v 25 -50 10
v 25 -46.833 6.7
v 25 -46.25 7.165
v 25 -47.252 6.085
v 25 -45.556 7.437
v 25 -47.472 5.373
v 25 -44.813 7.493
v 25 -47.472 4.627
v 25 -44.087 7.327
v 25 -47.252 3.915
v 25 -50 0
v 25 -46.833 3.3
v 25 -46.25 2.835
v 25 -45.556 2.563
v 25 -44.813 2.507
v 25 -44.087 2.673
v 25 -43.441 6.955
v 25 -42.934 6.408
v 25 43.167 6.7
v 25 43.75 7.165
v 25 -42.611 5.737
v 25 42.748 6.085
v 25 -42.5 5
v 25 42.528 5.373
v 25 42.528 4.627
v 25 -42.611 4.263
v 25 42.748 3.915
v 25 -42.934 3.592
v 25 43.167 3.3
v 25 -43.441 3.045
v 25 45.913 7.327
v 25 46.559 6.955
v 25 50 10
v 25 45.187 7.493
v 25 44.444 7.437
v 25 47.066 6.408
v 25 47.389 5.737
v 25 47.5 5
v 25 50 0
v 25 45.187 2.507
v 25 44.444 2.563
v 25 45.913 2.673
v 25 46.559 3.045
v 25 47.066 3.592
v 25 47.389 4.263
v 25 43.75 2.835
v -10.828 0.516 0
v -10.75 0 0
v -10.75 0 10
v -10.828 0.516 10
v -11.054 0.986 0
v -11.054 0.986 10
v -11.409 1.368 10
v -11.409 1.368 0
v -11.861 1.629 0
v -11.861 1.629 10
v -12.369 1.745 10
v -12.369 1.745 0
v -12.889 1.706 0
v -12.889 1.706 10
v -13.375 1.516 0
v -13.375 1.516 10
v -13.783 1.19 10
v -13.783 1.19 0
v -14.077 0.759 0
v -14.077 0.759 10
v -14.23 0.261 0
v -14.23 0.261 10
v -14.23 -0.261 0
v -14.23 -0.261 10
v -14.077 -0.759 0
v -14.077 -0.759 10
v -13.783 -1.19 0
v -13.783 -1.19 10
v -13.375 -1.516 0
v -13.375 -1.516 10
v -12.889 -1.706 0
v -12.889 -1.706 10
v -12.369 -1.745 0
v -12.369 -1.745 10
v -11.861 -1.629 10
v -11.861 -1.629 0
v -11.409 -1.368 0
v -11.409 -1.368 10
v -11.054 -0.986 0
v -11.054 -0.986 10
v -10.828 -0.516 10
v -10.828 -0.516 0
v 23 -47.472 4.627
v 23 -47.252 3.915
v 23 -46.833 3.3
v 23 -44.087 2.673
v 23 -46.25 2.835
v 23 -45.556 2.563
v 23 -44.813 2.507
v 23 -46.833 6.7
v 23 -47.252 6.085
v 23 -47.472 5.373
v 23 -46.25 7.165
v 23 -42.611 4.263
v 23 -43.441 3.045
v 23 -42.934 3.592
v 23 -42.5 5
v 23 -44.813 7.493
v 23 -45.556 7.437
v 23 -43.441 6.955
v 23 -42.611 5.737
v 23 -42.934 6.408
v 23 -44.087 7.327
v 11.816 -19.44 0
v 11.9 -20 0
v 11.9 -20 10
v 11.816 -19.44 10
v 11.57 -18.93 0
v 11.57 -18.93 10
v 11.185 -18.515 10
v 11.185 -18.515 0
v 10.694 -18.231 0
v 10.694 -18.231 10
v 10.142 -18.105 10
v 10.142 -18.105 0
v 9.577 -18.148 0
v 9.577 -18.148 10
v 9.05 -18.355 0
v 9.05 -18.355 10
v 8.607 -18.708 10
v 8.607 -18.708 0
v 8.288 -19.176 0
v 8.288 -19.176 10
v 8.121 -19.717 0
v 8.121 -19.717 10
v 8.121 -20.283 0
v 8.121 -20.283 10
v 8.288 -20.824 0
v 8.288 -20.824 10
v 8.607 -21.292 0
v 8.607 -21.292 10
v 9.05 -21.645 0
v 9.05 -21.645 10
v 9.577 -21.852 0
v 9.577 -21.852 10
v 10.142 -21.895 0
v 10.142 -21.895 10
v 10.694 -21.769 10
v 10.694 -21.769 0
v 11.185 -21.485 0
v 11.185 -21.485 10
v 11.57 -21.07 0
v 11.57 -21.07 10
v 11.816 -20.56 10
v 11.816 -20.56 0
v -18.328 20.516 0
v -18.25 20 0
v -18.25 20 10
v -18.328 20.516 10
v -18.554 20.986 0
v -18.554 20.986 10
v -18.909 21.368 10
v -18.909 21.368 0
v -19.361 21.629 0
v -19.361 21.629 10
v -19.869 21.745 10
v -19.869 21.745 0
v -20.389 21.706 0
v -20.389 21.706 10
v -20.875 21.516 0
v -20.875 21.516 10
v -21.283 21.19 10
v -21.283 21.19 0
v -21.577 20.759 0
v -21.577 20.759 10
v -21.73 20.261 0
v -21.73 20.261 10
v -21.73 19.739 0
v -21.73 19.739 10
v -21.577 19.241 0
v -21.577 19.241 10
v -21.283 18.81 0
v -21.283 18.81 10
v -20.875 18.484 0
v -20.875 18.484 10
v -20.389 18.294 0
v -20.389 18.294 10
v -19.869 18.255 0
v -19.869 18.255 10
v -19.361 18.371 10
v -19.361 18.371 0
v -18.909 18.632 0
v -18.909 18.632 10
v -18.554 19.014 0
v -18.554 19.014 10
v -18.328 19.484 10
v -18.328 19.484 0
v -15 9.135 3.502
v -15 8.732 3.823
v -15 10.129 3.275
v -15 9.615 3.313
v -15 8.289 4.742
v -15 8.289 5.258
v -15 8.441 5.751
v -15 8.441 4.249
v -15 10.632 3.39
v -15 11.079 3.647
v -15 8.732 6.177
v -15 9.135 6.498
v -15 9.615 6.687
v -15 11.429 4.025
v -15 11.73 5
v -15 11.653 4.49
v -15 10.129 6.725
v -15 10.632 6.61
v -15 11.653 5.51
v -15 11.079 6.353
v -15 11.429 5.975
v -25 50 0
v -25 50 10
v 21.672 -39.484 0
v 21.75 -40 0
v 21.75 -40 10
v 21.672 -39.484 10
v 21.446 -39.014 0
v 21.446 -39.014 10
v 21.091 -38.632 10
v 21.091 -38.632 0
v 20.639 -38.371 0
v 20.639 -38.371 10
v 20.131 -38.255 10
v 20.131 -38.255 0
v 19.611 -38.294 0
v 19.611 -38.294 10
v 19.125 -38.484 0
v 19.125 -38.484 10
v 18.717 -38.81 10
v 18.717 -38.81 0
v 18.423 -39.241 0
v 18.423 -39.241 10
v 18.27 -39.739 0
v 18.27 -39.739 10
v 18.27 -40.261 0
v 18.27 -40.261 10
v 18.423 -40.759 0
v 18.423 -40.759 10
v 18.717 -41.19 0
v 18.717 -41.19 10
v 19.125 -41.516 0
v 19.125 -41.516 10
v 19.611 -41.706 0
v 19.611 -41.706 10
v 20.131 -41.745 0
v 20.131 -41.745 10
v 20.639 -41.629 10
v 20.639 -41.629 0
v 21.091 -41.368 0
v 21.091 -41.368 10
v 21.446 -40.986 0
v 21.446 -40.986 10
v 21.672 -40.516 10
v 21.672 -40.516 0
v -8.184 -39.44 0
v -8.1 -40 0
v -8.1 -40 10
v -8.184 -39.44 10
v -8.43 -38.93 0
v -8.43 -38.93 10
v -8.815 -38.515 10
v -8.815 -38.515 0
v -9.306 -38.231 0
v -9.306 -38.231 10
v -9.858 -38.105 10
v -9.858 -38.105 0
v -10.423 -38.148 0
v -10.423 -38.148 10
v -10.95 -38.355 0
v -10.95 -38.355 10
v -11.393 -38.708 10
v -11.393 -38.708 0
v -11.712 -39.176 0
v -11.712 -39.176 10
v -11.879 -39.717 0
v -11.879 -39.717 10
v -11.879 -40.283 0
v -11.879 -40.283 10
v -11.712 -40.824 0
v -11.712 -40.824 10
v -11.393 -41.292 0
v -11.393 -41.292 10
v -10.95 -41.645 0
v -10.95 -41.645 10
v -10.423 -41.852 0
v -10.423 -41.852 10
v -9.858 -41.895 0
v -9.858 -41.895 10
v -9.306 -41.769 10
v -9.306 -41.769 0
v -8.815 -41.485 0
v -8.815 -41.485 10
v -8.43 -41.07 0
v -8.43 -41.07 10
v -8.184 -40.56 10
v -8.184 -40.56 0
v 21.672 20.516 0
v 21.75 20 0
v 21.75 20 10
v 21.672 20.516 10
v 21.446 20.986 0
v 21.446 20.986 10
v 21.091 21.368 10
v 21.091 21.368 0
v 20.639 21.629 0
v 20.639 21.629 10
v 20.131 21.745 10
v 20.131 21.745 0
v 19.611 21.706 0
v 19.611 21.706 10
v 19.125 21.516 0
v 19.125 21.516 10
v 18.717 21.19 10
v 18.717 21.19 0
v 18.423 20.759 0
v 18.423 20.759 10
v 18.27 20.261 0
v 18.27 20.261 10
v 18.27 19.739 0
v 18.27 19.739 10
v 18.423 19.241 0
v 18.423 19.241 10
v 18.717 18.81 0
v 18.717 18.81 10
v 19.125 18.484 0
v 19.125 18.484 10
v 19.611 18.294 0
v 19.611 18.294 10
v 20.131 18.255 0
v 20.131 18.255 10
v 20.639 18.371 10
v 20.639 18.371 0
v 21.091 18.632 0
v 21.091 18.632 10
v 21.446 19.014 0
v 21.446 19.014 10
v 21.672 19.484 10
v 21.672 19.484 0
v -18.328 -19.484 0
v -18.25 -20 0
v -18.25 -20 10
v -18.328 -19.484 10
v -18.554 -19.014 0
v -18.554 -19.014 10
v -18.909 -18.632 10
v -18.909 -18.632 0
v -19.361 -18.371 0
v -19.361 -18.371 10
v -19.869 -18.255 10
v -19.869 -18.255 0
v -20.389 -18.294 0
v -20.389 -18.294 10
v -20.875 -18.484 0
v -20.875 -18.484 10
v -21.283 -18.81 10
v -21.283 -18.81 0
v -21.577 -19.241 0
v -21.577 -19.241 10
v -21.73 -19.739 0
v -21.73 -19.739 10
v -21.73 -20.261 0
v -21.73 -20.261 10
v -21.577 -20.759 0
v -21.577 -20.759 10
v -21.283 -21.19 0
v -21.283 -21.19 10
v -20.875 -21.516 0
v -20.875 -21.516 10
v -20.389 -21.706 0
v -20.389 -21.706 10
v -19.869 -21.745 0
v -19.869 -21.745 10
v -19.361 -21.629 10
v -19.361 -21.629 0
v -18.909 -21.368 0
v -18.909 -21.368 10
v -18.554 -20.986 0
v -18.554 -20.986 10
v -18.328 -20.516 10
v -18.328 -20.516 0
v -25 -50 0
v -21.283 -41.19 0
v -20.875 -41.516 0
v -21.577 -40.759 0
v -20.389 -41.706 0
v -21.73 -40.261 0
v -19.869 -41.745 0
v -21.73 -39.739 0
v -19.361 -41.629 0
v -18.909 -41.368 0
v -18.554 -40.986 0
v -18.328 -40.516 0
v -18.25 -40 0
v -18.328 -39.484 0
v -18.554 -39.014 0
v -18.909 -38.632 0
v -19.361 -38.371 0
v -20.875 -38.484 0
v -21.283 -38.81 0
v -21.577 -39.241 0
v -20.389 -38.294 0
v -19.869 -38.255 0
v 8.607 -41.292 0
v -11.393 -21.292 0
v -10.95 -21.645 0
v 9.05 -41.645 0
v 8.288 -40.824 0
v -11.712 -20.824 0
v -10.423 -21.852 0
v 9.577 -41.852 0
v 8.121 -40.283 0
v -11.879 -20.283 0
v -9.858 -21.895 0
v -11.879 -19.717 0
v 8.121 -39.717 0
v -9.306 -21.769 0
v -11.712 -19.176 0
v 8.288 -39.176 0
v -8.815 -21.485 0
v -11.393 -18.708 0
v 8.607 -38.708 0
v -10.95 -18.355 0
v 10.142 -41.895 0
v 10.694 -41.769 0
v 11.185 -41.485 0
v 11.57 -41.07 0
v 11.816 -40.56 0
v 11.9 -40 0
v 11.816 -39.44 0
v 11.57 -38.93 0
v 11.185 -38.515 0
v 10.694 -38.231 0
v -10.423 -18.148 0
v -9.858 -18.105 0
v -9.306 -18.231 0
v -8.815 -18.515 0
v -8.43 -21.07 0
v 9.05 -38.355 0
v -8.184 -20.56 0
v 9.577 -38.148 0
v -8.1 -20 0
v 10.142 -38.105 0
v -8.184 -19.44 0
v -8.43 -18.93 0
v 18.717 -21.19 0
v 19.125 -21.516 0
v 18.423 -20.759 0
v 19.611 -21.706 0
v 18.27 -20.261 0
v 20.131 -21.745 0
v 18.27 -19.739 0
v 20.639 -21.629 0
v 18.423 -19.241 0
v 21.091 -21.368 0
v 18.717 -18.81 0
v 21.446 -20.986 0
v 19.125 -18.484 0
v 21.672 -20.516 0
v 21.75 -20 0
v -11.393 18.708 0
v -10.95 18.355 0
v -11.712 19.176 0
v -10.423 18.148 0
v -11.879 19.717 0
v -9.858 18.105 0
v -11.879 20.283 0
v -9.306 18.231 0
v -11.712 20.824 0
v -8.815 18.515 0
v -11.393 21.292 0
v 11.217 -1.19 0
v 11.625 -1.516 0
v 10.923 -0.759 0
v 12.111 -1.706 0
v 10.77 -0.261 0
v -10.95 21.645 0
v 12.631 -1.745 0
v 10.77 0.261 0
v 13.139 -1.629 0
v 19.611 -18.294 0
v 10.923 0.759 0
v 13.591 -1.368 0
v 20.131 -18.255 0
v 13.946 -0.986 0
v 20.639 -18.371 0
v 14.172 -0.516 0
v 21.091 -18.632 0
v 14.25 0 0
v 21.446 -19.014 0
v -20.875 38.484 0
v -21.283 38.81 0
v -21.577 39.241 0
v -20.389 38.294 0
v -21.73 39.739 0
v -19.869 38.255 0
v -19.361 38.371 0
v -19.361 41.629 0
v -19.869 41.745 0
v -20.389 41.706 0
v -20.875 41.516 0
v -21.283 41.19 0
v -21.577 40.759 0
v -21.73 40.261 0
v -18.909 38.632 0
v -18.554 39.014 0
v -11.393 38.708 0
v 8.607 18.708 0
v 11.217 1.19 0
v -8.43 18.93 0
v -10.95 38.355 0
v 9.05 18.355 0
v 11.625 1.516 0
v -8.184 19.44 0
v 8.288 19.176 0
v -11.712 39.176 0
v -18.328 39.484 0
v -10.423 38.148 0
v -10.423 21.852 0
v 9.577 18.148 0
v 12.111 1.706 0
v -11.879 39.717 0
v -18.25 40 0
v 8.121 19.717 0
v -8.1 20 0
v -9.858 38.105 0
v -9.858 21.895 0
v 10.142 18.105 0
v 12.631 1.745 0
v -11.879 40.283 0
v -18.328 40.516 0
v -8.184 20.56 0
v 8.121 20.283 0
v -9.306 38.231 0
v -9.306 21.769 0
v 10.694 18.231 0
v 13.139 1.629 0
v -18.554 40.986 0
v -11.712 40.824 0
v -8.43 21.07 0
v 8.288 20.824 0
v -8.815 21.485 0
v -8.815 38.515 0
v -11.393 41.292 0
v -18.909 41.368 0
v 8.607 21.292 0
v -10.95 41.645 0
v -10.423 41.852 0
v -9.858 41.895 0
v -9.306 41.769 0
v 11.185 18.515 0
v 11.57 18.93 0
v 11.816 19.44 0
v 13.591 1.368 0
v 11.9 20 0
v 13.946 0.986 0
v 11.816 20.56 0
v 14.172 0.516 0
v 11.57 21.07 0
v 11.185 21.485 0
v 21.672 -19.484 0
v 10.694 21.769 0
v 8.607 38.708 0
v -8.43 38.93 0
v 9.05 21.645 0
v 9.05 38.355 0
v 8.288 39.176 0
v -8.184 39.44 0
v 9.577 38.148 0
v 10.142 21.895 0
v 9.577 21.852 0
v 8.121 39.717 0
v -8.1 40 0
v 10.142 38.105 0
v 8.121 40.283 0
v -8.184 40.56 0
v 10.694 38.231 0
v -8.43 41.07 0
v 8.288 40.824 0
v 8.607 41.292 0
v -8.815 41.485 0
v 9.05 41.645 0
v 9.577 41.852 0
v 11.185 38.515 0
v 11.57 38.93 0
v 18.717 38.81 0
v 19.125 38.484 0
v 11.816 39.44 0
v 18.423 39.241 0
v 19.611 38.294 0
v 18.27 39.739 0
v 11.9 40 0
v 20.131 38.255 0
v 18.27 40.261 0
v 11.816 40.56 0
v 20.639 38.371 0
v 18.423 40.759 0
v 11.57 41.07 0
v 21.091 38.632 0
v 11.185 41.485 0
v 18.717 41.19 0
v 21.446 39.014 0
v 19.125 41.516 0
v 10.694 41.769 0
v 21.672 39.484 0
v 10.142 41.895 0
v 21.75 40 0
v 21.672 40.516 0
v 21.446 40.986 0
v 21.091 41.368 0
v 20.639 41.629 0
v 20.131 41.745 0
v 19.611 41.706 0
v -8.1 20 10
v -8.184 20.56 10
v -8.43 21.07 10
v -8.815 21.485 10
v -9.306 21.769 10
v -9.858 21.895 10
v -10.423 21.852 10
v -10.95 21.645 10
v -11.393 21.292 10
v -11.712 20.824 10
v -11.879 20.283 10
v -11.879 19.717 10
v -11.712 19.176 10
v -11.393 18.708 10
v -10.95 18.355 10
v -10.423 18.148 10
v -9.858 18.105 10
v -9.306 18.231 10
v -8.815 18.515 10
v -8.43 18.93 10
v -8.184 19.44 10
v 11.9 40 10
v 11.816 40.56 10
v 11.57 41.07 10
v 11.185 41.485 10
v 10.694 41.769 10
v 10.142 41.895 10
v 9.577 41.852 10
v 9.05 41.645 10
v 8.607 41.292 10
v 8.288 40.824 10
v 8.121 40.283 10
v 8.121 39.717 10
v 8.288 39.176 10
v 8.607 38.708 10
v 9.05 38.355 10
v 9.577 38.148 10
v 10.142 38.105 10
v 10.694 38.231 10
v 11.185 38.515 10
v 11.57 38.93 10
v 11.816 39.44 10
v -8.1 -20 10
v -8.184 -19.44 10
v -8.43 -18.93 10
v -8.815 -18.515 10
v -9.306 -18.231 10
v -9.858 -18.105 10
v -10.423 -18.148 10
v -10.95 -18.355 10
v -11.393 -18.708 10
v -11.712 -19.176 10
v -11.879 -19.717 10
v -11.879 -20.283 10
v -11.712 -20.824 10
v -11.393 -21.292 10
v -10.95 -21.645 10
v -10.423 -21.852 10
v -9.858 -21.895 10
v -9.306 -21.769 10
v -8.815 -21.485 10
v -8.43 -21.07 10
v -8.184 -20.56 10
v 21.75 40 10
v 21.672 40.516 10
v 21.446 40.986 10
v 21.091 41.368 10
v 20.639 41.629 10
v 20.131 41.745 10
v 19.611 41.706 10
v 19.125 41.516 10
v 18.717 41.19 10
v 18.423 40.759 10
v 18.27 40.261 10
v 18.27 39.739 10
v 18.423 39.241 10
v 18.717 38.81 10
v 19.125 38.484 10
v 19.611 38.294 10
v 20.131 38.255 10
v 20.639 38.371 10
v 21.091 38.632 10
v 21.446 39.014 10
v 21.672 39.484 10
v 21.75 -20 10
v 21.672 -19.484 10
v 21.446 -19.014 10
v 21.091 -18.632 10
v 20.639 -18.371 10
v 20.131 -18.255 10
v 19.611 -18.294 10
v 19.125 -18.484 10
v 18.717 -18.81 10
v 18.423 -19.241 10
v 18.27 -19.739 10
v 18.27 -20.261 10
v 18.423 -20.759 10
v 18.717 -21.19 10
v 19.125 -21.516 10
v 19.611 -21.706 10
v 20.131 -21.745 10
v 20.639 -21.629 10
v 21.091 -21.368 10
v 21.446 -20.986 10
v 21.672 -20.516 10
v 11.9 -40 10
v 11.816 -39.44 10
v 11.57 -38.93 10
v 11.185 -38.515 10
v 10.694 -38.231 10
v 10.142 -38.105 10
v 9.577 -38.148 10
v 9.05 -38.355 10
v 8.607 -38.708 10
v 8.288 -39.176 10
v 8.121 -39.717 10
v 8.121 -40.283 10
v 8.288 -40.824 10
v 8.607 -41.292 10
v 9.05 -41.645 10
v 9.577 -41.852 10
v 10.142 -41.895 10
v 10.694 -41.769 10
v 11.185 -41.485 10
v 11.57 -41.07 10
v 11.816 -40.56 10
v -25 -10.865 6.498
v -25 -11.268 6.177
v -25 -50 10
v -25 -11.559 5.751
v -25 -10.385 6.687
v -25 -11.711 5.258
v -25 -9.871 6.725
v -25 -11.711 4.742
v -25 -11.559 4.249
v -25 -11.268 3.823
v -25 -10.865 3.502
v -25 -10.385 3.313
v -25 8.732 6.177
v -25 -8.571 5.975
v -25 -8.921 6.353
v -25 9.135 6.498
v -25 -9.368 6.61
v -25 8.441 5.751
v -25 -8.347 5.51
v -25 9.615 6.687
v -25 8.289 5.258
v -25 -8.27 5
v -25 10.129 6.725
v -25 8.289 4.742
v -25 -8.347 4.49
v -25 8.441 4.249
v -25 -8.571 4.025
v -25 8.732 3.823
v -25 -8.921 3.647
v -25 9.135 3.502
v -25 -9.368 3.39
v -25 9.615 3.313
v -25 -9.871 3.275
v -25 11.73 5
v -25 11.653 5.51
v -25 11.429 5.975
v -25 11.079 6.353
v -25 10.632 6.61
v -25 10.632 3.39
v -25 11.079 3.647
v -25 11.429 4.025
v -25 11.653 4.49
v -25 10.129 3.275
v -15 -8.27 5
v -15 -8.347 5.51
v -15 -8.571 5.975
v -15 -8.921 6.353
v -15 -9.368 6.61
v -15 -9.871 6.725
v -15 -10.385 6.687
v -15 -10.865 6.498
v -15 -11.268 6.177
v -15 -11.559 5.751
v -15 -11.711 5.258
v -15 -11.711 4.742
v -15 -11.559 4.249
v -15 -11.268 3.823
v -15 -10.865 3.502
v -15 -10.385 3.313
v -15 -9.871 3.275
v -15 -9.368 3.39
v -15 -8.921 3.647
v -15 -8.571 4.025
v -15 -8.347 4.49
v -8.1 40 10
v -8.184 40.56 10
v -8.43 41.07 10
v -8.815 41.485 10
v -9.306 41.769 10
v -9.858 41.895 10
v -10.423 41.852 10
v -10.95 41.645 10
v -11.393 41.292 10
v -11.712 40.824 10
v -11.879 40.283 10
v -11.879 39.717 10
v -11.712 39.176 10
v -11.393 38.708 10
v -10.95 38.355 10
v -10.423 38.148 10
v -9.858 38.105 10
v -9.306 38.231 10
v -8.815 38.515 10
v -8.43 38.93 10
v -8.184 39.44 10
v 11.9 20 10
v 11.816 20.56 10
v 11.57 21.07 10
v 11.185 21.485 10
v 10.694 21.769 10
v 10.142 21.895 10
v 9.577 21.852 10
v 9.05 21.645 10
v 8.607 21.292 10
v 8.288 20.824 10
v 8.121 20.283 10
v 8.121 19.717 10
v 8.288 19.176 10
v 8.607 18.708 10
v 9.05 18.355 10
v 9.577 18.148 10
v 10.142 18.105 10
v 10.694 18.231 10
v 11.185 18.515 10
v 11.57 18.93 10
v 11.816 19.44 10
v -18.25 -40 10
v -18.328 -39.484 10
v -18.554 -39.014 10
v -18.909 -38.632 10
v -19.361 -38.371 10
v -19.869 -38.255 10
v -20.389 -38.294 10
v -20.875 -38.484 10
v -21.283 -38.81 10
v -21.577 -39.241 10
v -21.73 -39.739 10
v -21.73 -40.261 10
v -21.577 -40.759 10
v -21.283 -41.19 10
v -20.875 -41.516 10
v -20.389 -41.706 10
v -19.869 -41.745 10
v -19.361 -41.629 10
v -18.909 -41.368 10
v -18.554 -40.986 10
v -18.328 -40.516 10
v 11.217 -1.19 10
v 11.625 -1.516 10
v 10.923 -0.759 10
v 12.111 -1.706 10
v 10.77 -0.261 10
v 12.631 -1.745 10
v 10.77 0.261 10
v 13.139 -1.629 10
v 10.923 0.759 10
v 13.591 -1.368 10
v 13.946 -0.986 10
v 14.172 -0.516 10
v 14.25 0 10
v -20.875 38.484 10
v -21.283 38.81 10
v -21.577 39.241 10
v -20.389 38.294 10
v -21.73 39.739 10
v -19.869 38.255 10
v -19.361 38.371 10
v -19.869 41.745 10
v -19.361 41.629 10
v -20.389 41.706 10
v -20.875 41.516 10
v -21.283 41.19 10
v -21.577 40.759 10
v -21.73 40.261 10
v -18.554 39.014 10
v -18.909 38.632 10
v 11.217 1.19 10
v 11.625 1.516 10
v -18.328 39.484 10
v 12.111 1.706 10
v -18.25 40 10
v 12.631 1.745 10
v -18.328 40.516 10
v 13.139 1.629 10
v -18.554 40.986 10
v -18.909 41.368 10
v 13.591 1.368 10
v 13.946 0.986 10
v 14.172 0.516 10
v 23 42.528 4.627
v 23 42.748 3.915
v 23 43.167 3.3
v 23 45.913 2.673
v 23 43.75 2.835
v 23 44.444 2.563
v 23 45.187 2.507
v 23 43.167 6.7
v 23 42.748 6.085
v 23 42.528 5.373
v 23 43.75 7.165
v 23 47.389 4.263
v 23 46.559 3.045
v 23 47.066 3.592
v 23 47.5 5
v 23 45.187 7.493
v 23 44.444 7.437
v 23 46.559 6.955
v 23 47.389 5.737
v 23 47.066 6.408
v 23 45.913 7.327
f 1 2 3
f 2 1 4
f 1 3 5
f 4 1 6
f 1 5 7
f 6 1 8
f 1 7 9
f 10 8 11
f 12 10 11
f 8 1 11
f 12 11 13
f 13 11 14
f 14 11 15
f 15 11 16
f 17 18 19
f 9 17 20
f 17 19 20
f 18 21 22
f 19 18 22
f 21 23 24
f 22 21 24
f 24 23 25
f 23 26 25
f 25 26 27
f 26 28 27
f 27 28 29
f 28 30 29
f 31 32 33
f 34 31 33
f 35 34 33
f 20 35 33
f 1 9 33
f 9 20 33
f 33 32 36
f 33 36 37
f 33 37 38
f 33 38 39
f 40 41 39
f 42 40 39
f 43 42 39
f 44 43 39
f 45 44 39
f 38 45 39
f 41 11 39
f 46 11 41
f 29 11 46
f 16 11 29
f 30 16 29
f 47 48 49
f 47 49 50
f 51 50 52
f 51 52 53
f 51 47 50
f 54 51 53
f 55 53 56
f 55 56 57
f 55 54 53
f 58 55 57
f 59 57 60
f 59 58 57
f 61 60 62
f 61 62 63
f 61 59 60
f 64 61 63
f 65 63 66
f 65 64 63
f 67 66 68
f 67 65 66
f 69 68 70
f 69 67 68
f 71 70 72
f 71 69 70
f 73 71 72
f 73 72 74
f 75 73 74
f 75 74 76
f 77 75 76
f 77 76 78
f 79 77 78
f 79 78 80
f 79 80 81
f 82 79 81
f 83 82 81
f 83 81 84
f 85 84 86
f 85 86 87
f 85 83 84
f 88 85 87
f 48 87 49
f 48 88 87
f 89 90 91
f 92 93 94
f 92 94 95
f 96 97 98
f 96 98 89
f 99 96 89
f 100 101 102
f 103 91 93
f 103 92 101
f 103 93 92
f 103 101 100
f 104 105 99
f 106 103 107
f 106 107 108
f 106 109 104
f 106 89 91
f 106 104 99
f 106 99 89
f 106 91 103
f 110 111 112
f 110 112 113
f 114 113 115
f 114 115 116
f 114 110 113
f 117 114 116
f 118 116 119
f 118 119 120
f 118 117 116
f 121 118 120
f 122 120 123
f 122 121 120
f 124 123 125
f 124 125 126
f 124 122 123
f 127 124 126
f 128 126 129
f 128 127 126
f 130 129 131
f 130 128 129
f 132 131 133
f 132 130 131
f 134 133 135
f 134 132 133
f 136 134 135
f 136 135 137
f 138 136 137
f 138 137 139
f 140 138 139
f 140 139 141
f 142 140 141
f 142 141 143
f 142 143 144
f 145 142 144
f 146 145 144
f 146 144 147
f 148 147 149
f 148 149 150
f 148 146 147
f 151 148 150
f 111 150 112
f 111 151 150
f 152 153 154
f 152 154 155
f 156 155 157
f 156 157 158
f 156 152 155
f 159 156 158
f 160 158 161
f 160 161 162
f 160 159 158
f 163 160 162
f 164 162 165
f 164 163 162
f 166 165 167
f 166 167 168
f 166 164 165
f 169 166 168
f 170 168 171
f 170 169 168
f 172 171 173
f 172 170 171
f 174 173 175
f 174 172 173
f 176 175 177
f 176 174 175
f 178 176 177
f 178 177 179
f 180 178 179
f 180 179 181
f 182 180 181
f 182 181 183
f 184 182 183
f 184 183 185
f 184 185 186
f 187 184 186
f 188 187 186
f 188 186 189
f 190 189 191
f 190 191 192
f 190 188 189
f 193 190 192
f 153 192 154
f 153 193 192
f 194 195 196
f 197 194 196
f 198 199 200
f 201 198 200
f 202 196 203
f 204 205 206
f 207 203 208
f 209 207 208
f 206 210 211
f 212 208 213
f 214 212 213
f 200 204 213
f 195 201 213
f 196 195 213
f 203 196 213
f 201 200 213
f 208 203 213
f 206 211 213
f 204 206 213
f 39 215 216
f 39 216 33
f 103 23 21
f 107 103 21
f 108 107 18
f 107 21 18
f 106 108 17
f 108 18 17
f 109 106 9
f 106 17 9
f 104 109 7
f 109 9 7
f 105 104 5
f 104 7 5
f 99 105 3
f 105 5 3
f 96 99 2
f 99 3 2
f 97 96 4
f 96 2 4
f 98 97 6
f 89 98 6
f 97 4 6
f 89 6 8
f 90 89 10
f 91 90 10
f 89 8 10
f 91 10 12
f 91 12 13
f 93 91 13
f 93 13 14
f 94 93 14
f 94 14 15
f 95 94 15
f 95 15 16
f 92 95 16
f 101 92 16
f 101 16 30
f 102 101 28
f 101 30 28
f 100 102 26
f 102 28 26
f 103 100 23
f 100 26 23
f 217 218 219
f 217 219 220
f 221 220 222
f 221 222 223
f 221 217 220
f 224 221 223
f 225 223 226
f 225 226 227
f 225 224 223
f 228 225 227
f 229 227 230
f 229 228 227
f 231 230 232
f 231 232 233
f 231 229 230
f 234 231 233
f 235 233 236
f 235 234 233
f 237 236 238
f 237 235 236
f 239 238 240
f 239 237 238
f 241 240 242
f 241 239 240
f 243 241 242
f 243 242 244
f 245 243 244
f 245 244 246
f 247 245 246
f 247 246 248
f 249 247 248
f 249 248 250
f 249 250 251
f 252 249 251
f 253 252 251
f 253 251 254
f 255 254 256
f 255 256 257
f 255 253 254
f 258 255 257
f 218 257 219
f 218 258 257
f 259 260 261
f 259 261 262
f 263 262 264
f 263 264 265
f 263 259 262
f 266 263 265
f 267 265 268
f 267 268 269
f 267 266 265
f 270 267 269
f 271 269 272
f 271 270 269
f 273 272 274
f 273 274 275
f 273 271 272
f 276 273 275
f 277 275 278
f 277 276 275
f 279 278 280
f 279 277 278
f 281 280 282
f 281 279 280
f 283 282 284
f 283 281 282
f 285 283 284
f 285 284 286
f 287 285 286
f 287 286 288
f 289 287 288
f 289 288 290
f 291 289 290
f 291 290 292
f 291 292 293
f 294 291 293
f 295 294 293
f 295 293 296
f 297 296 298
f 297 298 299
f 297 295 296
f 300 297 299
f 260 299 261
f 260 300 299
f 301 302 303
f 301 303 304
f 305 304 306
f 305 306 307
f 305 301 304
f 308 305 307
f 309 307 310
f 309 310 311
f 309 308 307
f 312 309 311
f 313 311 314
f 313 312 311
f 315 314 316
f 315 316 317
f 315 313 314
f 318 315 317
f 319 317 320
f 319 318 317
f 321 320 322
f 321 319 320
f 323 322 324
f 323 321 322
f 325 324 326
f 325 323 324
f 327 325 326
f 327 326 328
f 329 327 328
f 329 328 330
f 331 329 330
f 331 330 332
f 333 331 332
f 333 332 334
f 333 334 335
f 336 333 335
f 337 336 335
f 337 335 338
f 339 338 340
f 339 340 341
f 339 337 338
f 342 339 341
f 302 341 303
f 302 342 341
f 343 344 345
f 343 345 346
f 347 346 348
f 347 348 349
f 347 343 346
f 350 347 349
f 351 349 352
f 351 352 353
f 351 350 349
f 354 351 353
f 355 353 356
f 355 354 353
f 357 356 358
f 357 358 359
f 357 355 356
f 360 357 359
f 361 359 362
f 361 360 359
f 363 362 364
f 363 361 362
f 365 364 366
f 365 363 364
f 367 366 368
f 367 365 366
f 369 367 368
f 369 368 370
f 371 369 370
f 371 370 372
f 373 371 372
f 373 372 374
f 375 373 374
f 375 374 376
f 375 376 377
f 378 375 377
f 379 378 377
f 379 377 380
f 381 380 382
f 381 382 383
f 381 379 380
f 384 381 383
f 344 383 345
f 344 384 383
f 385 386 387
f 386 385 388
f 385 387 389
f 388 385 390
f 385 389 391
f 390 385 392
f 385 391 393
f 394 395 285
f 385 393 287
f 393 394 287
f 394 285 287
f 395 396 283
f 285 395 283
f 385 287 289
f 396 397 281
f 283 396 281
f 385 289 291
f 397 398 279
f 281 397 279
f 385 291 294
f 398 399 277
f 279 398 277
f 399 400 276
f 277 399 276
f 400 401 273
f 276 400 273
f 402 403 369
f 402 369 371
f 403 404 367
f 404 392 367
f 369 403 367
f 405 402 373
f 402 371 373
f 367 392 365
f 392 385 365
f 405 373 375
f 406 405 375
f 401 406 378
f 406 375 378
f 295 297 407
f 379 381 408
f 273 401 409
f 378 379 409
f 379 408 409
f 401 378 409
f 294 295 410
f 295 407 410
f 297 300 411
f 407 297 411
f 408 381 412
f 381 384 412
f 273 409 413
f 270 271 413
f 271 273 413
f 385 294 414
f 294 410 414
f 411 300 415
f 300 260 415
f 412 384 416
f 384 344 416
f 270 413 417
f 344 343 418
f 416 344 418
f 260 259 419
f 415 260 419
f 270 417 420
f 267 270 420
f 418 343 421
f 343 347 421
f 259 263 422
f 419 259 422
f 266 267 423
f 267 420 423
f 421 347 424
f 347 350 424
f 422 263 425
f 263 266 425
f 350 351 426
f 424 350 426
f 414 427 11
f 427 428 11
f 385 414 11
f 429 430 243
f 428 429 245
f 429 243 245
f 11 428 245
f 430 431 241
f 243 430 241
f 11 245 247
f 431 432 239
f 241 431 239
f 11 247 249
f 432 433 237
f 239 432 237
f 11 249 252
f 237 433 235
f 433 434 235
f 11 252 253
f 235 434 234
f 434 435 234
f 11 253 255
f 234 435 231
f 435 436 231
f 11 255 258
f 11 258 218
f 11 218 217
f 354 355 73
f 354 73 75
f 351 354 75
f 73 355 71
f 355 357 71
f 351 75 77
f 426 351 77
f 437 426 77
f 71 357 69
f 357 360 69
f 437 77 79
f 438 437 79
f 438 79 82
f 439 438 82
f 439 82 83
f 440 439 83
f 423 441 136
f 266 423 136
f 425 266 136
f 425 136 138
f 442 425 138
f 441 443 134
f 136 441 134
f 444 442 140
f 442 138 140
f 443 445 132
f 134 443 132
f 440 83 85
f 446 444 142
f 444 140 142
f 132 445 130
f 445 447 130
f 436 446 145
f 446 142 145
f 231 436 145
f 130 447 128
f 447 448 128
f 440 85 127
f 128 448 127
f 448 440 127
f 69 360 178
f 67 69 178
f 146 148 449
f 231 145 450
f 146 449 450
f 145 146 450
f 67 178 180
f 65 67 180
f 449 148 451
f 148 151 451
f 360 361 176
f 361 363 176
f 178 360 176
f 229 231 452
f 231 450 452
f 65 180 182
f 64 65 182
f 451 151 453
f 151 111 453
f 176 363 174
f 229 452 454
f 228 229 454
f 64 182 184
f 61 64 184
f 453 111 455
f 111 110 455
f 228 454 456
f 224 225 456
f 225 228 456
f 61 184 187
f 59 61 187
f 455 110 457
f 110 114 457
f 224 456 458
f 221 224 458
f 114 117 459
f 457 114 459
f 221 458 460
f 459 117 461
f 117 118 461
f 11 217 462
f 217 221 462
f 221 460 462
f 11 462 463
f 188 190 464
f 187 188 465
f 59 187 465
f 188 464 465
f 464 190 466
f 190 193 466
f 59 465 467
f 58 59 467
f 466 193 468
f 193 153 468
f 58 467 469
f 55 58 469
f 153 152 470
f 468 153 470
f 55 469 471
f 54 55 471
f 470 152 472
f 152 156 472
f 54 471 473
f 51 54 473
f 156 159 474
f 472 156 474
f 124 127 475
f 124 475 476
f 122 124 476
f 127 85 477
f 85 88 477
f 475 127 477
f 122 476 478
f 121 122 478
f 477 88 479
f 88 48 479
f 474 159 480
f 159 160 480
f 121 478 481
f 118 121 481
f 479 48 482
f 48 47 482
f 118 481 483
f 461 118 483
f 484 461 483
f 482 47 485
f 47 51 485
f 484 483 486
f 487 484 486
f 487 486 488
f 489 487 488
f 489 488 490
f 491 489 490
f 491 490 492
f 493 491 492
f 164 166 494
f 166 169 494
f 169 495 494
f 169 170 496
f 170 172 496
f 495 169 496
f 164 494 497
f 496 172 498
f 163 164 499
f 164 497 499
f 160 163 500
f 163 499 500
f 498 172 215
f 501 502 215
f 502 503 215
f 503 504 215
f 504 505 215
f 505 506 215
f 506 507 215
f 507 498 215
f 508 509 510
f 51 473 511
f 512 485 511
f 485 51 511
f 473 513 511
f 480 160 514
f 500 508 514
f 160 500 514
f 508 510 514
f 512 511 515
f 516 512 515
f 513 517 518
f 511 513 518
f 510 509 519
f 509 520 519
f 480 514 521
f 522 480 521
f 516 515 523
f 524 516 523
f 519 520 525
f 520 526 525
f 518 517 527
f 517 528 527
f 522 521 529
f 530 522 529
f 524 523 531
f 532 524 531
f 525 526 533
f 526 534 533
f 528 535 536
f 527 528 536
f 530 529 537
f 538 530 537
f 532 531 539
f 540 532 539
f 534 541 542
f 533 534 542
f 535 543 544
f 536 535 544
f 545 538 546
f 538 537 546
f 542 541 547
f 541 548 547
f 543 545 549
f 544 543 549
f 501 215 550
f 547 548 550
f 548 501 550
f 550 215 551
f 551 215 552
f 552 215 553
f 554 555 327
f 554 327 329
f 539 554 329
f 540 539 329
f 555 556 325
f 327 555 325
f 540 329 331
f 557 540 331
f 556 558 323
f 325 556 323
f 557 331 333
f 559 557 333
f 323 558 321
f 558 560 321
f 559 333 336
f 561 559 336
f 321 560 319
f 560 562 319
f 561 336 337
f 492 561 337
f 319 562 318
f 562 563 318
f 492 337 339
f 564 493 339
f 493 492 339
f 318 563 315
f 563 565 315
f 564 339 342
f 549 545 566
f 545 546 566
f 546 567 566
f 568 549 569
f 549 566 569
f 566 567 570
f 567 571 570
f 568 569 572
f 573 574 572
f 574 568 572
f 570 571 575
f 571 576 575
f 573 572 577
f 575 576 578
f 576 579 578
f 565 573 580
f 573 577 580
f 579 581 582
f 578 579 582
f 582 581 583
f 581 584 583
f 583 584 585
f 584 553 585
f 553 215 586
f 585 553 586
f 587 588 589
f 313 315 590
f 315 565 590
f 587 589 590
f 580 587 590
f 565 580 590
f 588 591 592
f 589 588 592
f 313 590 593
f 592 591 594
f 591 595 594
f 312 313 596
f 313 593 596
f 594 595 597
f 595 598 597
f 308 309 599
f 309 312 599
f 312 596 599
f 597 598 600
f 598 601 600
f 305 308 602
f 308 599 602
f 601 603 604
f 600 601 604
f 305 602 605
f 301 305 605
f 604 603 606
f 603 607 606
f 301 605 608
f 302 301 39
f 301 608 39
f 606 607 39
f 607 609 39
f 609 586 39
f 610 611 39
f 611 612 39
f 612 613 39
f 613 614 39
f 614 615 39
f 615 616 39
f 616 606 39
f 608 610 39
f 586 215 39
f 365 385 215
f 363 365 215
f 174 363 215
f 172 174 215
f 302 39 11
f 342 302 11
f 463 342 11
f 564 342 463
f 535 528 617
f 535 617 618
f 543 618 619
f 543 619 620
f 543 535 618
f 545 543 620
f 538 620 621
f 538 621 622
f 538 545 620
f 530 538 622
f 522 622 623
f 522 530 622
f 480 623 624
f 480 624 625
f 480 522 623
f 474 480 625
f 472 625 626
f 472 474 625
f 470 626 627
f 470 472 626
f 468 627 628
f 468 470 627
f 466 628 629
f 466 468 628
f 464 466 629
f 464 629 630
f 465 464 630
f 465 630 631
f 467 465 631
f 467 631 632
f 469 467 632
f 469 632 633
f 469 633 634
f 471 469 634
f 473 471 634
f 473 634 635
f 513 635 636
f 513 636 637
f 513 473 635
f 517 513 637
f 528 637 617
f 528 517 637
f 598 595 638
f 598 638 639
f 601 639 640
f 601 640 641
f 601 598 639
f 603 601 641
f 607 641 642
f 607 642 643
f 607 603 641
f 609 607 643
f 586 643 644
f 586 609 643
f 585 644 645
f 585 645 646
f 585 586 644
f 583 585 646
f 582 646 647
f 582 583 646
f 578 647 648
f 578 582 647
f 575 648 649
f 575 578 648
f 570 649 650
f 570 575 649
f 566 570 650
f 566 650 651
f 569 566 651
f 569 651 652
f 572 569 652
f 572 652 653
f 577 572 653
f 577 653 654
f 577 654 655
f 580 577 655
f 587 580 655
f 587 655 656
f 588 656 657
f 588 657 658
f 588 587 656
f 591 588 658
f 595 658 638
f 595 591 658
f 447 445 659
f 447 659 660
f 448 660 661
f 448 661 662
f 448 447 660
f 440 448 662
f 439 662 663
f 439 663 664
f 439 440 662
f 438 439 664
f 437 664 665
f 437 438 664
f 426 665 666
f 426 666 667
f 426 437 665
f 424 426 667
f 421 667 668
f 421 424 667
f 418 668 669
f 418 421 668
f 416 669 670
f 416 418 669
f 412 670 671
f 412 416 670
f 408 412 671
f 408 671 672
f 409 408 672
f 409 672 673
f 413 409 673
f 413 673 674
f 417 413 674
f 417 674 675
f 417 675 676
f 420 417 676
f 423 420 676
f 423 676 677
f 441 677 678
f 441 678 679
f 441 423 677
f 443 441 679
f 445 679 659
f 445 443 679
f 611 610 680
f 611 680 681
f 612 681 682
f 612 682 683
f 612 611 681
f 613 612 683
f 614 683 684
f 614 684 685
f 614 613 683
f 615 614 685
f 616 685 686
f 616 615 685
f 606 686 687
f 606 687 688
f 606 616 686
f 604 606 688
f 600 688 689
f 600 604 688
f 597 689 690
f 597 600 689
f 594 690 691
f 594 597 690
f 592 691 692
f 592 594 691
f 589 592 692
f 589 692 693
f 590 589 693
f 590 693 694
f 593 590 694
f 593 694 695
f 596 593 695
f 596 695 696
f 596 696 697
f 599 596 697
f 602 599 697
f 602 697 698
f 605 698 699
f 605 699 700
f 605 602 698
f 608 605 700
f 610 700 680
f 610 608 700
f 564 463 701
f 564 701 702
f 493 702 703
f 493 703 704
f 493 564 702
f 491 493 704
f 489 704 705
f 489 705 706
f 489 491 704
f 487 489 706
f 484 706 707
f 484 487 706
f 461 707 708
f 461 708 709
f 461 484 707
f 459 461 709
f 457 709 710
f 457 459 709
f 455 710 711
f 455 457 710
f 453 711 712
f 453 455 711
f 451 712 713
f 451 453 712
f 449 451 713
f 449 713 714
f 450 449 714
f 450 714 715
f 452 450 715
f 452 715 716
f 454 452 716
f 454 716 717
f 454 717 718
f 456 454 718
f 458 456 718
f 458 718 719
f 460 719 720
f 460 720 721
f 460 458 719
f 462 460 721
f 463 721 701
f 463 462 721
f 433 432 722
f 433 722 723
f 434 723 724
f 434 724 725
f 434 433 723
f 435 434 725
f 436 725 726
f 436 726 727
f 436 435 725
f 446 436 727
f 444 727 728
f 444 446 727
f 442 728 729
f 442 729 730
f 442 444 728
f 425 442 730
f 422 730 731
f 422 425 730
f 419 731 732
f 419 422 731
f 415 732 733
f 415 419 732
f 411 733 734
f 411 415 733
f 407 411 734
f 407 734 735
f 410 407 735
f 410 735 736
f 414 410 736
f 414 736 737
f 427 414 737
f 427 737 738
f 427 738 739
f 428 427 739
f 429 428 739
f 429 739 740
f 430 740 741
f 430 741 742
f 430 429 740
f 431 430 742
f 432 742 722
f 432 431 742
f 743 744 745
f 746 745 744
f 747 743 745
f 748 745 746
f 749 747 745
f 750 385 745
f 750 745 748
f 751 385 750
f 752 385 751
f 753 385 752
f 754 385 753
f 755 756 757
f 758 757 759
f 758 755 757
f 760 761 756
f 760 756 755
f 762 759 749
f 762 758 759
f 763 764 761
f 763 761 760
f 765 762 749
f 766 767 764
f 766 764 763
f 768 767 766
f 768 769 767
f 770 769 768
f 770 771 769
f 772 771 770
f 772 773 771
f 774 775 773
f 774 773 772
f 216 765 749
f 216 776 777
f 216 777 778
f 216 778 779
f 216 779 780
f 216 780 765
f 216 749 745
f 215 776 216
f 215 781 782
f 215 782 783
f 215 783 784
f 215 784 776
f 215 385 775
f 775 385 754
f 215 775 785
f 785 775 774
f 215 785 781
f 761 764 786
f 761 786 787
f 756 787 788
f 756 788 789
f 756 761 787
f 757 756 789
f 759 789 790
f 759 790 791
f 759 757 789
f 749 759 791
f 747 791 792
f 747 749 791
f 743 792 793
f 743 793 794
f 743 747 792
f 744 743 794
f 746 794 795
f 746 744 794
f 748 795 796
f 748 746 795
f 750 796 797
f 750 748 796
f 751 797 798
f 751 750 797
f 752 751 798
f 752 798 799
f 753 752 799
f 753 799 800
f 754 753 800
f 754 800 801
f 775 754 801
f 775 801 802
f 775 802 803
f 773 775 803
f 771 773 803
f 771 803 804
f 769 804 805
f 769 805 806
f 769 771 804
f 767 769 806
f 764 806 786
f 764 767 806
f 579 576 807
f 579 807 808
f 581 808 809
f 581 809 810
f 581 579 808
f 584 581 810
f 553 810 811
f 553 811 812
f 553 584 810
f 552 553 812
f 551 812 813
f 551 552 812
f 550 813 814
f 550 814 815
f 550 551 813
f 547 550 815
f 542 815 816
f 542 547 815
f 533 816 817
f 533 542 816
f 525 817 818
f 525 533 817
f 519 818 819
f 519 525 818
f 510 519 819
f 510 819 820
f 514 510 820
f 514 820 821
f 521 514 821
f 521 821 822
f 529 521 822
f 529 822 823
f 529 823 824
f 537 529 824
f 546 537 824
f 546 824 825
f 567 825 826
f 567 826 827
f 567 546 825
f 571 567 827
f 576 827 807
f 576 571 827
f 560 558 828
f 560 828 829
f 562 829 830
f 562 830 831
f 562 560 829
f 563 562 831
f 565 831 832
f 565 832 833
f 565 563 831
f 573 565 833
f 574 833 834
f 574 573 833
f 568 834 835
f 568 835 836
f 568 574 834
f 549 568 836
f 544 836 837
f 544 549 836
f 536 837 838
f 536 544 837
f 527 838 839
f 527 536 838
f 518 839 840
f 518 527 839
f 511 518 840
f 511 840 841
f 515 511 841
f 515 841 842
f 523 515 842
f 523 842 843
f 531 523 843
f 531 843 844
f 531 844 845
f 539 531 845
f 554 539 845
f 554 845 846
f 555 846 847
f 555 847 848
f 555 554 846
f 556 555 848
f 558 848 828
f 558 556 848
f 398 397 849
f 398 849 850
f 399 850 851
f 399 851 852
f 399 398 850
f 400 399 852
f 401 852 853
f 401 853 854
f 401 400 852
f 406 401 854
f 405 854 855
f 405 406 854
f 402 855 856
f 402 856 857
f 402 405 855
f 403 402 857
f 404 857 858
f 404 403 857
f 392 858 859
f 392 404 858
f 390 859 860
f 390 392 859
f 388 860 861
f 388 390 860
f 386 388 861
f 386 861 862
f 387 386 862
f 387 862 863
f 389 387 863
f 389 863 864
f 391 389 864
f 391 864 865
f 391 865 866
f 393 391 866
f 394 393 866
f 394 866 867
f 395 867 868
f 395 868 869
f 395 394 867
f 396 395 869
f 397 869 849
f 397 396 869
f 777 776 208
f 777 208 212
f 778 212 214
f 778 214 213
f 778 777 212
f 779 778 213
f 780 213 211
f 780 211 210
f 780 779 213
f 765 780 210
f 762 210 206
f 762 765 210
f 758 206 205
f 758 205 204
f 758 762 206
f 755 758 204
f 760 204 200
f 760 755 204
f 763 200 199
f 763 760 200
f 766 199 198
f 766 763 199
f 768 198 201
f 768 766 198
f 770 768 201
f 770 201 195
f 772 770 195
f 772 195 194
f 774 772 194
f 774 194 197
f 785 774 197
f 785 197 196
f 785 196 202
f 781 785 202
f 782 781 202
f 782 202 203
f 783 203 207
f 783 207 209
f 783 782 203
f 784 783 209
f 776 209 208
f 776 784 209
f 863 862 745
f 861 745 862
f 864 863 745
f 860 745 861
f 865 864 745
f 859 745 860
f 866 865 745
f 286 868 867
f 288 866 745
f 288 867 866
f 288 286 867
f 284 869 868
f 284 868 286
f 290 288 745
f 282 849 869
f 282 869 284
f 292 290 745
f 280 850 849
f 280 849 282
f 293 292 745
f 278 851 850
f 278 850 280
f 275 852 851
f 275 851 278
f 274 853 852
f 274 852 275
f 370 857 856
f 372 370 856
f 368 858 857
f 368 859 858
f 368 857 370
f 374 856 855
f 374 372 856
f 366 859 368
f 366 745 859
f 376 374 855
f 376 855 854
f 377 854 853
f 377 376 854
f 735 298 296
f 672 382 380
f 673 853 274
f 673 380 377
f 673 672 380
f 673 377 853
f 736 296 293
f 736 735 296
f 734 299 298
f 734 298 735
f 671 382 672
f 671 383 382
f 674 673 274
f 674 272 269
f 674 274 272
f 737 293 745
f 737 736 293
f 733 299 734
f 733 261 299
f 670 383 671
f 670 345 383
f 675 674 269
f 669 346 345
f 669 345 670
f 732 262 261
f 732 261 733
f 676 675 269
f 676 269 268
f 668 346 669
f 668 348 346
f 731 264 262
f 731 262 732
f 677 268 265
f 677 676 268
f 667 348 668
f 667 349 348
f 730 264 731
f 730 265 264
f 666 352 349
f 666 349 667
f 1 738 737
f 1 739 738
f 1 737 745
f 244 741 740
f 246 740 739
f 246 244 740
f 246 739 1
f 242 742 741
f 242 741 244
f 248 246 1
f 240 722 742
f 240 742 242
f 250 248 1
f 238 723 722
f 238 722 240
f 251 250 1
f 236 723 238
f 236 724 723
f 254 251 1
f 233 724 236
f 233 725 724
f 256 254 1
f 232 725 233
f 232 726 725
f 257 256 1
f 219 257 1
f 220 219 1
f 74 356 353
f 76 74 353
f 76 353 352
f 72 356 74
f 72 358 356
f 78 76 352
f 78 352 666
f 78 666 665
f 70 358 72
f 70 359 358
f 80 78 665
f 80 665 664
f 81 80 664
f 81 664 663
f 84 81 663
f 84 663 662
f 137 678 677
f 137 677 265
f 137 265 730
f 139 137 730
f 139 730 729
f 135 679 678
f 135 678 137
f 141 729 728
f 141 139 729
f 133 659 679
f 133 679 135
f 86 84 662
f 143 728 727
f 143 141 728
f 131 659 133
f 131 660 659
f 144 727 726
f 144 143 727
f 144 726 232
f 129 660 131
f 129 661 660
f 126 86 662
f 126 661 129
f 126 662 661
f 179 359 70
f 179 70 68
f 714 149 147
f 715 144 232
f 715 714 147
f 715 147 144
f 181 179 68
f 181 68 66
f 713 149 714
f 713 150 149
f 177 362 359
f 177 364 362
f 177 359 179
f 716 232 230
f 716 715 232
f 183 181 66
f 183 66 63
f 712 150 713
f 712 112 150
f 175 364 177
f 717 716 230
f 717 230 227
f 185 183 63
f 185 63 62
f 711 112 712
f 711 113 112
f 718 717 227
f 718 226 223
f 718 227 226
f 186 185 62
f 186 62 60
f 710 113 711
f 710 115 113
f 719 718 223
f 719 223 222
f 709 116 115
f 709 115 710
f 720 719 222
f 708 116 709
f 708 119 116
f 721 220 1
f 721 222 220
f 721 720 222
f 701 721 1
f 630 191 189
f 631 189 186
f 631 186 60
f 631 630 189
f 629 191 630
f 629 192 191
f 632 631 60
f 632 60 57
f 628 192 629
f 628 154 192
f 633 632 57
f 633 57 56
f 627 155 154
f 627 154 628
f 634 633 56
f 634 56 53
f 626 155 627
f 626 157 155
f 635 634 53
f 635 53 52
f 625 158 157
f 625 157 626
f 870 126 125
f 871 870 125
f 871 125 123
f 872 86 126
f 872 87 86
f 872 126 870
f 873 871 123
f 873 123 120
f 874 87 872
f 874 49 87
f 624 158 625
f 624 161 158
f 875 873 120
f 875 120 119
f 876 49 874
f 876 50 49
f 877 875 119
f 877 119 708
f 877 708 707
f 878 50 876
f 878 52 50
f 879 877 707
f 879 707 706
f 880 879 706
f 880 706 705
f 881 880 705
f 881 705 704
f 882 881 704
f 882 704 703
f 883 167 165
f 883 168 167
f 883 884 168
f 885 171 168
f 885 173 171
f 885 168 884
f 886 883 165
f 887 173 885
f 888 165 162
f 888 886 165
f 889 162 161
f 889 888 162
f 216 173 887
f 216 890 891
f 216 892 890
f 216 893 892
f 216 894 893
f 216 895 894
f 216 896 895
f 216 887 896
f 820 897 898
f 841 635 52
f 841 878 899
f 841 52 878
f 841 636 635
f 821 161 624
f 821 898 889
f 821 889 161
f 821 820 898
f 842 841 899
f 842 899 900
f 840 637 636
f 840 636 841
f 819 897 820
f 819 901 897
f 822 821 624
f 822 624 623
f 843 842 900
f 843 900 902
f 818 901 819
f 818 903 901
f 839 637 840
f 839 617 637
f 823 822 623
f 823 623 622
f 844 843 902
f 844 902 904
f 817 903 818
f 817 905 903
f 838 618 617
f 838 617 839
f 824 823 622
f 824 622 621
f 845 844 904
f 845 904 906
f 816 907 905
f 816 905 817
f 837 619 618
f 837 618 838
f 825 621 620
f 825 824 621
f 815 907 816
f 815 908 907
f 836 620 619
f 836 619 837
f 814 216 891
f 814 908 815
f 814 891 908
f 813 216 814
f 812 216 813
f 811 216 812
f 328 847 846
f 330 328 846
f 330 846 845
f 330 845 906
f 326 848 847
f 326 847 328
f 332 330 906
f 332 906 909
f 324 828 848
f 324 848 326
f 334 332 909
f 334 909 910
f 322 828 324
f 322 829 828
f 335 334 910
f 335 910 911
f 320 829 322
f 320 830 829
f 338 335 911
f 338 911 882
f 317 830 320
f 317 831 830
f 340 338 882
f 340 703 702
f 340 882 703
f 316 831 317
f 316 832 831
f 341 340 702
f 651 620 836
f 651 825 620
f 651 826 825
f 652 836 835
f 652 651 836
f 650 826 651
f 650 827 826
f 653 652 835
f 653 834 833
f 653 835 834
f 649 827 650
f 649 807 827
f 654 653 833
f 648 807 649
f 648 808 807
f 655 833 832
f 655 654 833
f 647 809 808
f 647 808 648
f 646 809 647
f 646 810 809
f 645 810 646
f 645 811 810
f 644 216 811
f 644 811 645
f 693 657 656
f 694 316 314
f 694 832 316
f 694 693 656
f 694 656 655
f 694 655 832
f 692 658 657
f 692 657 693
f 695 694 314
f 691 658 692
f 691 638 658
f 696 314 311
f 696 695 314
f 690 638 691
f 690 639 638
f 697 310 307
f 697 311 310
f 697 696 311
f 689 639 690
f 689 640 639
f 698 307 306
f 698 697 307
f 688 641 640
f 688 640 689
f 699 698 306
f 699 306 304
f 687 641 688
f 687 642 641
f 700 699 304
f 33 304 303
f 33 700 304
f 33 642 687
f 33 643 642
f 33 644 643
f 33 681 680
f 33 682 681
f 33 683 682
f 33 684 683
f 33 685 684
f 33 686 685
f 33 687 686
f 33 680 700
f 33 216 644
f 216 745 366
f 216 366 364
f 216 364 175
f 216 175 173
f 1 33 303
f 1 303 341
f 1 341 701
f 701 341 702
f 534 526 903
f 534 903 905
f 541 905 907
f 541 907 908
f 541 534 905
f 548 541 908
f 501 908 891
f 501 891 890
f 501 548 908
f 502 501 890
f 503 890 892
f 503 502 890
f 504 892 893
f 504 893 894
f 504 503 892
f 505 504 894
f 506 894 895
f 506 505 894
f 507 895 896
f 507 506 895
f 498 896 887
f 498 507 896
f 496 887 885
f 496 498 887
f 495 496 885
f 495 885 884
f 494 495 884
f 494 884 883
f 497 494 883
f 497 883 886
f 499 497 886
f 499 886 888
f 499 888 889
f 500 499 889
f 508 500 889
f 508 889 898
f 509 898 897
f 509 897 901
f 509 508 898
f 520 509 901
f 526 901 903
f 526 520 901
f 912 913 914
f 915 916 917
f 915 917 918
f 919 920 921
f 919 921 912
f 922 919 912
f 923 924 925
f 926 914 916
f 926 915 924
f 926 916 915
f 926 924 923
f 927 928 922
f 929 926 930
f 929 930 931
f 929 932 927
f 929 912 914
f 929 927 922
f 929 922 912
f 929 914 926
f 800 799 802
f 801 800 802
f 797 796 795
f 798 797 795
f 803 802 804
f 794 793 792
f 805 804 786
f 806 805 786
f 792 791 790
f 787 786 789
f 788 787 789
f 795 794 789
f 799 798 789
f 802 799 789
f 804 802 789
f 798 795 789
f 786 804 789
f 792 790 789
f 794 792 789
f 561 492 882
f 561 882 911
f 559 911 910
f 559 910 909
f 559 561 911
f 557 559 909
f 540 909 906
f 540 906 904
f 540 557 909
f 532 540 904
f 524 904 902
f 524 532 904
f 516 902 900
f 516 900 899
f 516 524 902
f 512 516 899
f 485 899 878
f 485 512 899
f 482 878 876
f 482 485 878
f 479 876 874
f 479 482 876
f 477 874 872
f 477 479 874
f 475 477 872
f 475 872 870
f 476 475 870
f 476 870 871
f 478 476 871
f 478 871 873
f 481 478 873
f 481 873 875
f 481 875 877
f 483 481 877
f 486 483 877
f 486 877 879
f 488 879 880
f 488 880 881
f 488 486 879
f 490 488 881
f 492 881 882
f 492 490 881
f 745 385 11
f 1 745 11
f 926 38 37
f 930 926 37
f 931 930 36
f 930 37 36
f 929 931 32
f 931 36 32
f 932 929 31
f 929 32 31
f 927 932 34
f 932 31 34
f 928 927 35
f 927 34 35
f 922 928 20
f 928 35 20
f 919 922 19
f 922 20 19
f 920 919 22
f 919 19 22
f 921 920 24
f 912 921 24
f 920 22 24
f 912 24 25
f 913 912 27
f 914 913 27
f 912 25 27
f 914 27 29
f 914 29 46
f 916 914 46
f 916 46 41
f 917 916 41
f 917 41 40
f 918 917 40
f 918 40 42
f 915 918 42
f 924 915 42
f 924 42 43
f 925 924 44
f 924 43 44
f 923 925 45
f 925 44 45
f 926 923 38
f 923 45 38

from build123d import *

# Parameters (mm, degrees)
SKETCH133_W     = 50
SKETCH133_H     = 100
SKETCH133_R     = 1.9
SKETCH133_R_2   = 1.75
PAD079_DEPTH    = 10
SKETCH143_R     = 2.5
POCKET049_DEPTH = 2
SKETCH149_R     = 1.73
POCKET051_DEPTH = 10


with BuildPart() as part:
    # Sketch133 → Pad079 (new body)
    with BuildSketch(Plane.XY):
        Rectangle(SKETCH133_W, SKETCH133_H)
        with Locations((-10, 40)):
            Circle(SKETCH133_R, mode=Mode.SUBTRACT)
        with Locations((10, 40)):
            Circle(SKETCH133_R, mode=Mode.SUBTRACT)
        with Locations((10, 20)):
            Circle(SKETCH133_R, mode=Mode.SUBTRACT)
        with Locations((-10, 20)):
            Circle(SKETCH133_R, mode=Mode.SUBTRACT)
        with Locations((-10, -20)):
            Circle(SKETCH133_R, mode=Mode.SUBTRACT)
        with Locations((10, -20)):
            Circle(SKETCH133_R, mode=Mode.SUBTRACT)
        with Locations((10, -40)):
            Circle(SKETCH133_R, mode=Mode.SUBTRACT)
        with Locations((-10, -40)):
            Circle(SKETCH133_R, mode=Mode.SUBTRACT)
        with Locations((12.5, 0)):
            Circle(SKETCH133_R_2, mode=Mode.SUBTRACT)
        with Locations((-12.5, 0)):
            Circle(SKETCH133_R_2, mode=Mode.SUBTRACT)
        with Locations((20, 40)):
            Circle(SKETCH133_R_2, mode=Mode.SUBTRACT)
        with Locations((20, 20)):
            Circle(SKETCH133_R_2, mode=Mode.SUBTRACT)
        with Locations((-20, 40)):
            Circle(SKETCH133_R_2, mode=Mode.SUBTRACT)
        with Locations((-20, 20)):
            Circle(SKETCH133_R_2, mode=Mode.SUBTRACT)
        with Locations((-20, -20)):
            Circle(SKETCH133_R_2, mode=Mode.SUBTRACT)
        with Locations((-20, -40)):
            Circle(SKETCH133_R_2, mode=Mode.SUBTRACT)
        with Locations((20, -20)):
            Circle(SKETCH133_R_2, mode=Mode.SUBTRACT)
        with Locations((20, -40)):
            Circle(SKETCH133_R_2, mode=Mode.SUBTRACT)
    extrude(amount=PAD079_DEPTH)

    # Sketch143 → Pocket049 (cut)
    with BuildSketch(Plane.YZ.offset(25)):
        with Locations((-45, 5)):
            Circle(SKETCH143_R)
        with Locations((45, 5)):
            Circle(SKETCH143_R)
    extrude(amount=-POCKET049_DEPTH, mode=Mode.SUBTRACT)

    # Sketch149 → Pocket051 (cut)
    with BuildSketch(Plane.YZ.offset(-25)):
        with Locations((-10, 5)):
            Circle(SKETCH149_R)
        with Locations((10, 5)):
            Circle(SKETCH149_R)
    extrude(amount=POCKET051_DEPTH, mode=Mode.SUBTRACT)


solid = part.part
